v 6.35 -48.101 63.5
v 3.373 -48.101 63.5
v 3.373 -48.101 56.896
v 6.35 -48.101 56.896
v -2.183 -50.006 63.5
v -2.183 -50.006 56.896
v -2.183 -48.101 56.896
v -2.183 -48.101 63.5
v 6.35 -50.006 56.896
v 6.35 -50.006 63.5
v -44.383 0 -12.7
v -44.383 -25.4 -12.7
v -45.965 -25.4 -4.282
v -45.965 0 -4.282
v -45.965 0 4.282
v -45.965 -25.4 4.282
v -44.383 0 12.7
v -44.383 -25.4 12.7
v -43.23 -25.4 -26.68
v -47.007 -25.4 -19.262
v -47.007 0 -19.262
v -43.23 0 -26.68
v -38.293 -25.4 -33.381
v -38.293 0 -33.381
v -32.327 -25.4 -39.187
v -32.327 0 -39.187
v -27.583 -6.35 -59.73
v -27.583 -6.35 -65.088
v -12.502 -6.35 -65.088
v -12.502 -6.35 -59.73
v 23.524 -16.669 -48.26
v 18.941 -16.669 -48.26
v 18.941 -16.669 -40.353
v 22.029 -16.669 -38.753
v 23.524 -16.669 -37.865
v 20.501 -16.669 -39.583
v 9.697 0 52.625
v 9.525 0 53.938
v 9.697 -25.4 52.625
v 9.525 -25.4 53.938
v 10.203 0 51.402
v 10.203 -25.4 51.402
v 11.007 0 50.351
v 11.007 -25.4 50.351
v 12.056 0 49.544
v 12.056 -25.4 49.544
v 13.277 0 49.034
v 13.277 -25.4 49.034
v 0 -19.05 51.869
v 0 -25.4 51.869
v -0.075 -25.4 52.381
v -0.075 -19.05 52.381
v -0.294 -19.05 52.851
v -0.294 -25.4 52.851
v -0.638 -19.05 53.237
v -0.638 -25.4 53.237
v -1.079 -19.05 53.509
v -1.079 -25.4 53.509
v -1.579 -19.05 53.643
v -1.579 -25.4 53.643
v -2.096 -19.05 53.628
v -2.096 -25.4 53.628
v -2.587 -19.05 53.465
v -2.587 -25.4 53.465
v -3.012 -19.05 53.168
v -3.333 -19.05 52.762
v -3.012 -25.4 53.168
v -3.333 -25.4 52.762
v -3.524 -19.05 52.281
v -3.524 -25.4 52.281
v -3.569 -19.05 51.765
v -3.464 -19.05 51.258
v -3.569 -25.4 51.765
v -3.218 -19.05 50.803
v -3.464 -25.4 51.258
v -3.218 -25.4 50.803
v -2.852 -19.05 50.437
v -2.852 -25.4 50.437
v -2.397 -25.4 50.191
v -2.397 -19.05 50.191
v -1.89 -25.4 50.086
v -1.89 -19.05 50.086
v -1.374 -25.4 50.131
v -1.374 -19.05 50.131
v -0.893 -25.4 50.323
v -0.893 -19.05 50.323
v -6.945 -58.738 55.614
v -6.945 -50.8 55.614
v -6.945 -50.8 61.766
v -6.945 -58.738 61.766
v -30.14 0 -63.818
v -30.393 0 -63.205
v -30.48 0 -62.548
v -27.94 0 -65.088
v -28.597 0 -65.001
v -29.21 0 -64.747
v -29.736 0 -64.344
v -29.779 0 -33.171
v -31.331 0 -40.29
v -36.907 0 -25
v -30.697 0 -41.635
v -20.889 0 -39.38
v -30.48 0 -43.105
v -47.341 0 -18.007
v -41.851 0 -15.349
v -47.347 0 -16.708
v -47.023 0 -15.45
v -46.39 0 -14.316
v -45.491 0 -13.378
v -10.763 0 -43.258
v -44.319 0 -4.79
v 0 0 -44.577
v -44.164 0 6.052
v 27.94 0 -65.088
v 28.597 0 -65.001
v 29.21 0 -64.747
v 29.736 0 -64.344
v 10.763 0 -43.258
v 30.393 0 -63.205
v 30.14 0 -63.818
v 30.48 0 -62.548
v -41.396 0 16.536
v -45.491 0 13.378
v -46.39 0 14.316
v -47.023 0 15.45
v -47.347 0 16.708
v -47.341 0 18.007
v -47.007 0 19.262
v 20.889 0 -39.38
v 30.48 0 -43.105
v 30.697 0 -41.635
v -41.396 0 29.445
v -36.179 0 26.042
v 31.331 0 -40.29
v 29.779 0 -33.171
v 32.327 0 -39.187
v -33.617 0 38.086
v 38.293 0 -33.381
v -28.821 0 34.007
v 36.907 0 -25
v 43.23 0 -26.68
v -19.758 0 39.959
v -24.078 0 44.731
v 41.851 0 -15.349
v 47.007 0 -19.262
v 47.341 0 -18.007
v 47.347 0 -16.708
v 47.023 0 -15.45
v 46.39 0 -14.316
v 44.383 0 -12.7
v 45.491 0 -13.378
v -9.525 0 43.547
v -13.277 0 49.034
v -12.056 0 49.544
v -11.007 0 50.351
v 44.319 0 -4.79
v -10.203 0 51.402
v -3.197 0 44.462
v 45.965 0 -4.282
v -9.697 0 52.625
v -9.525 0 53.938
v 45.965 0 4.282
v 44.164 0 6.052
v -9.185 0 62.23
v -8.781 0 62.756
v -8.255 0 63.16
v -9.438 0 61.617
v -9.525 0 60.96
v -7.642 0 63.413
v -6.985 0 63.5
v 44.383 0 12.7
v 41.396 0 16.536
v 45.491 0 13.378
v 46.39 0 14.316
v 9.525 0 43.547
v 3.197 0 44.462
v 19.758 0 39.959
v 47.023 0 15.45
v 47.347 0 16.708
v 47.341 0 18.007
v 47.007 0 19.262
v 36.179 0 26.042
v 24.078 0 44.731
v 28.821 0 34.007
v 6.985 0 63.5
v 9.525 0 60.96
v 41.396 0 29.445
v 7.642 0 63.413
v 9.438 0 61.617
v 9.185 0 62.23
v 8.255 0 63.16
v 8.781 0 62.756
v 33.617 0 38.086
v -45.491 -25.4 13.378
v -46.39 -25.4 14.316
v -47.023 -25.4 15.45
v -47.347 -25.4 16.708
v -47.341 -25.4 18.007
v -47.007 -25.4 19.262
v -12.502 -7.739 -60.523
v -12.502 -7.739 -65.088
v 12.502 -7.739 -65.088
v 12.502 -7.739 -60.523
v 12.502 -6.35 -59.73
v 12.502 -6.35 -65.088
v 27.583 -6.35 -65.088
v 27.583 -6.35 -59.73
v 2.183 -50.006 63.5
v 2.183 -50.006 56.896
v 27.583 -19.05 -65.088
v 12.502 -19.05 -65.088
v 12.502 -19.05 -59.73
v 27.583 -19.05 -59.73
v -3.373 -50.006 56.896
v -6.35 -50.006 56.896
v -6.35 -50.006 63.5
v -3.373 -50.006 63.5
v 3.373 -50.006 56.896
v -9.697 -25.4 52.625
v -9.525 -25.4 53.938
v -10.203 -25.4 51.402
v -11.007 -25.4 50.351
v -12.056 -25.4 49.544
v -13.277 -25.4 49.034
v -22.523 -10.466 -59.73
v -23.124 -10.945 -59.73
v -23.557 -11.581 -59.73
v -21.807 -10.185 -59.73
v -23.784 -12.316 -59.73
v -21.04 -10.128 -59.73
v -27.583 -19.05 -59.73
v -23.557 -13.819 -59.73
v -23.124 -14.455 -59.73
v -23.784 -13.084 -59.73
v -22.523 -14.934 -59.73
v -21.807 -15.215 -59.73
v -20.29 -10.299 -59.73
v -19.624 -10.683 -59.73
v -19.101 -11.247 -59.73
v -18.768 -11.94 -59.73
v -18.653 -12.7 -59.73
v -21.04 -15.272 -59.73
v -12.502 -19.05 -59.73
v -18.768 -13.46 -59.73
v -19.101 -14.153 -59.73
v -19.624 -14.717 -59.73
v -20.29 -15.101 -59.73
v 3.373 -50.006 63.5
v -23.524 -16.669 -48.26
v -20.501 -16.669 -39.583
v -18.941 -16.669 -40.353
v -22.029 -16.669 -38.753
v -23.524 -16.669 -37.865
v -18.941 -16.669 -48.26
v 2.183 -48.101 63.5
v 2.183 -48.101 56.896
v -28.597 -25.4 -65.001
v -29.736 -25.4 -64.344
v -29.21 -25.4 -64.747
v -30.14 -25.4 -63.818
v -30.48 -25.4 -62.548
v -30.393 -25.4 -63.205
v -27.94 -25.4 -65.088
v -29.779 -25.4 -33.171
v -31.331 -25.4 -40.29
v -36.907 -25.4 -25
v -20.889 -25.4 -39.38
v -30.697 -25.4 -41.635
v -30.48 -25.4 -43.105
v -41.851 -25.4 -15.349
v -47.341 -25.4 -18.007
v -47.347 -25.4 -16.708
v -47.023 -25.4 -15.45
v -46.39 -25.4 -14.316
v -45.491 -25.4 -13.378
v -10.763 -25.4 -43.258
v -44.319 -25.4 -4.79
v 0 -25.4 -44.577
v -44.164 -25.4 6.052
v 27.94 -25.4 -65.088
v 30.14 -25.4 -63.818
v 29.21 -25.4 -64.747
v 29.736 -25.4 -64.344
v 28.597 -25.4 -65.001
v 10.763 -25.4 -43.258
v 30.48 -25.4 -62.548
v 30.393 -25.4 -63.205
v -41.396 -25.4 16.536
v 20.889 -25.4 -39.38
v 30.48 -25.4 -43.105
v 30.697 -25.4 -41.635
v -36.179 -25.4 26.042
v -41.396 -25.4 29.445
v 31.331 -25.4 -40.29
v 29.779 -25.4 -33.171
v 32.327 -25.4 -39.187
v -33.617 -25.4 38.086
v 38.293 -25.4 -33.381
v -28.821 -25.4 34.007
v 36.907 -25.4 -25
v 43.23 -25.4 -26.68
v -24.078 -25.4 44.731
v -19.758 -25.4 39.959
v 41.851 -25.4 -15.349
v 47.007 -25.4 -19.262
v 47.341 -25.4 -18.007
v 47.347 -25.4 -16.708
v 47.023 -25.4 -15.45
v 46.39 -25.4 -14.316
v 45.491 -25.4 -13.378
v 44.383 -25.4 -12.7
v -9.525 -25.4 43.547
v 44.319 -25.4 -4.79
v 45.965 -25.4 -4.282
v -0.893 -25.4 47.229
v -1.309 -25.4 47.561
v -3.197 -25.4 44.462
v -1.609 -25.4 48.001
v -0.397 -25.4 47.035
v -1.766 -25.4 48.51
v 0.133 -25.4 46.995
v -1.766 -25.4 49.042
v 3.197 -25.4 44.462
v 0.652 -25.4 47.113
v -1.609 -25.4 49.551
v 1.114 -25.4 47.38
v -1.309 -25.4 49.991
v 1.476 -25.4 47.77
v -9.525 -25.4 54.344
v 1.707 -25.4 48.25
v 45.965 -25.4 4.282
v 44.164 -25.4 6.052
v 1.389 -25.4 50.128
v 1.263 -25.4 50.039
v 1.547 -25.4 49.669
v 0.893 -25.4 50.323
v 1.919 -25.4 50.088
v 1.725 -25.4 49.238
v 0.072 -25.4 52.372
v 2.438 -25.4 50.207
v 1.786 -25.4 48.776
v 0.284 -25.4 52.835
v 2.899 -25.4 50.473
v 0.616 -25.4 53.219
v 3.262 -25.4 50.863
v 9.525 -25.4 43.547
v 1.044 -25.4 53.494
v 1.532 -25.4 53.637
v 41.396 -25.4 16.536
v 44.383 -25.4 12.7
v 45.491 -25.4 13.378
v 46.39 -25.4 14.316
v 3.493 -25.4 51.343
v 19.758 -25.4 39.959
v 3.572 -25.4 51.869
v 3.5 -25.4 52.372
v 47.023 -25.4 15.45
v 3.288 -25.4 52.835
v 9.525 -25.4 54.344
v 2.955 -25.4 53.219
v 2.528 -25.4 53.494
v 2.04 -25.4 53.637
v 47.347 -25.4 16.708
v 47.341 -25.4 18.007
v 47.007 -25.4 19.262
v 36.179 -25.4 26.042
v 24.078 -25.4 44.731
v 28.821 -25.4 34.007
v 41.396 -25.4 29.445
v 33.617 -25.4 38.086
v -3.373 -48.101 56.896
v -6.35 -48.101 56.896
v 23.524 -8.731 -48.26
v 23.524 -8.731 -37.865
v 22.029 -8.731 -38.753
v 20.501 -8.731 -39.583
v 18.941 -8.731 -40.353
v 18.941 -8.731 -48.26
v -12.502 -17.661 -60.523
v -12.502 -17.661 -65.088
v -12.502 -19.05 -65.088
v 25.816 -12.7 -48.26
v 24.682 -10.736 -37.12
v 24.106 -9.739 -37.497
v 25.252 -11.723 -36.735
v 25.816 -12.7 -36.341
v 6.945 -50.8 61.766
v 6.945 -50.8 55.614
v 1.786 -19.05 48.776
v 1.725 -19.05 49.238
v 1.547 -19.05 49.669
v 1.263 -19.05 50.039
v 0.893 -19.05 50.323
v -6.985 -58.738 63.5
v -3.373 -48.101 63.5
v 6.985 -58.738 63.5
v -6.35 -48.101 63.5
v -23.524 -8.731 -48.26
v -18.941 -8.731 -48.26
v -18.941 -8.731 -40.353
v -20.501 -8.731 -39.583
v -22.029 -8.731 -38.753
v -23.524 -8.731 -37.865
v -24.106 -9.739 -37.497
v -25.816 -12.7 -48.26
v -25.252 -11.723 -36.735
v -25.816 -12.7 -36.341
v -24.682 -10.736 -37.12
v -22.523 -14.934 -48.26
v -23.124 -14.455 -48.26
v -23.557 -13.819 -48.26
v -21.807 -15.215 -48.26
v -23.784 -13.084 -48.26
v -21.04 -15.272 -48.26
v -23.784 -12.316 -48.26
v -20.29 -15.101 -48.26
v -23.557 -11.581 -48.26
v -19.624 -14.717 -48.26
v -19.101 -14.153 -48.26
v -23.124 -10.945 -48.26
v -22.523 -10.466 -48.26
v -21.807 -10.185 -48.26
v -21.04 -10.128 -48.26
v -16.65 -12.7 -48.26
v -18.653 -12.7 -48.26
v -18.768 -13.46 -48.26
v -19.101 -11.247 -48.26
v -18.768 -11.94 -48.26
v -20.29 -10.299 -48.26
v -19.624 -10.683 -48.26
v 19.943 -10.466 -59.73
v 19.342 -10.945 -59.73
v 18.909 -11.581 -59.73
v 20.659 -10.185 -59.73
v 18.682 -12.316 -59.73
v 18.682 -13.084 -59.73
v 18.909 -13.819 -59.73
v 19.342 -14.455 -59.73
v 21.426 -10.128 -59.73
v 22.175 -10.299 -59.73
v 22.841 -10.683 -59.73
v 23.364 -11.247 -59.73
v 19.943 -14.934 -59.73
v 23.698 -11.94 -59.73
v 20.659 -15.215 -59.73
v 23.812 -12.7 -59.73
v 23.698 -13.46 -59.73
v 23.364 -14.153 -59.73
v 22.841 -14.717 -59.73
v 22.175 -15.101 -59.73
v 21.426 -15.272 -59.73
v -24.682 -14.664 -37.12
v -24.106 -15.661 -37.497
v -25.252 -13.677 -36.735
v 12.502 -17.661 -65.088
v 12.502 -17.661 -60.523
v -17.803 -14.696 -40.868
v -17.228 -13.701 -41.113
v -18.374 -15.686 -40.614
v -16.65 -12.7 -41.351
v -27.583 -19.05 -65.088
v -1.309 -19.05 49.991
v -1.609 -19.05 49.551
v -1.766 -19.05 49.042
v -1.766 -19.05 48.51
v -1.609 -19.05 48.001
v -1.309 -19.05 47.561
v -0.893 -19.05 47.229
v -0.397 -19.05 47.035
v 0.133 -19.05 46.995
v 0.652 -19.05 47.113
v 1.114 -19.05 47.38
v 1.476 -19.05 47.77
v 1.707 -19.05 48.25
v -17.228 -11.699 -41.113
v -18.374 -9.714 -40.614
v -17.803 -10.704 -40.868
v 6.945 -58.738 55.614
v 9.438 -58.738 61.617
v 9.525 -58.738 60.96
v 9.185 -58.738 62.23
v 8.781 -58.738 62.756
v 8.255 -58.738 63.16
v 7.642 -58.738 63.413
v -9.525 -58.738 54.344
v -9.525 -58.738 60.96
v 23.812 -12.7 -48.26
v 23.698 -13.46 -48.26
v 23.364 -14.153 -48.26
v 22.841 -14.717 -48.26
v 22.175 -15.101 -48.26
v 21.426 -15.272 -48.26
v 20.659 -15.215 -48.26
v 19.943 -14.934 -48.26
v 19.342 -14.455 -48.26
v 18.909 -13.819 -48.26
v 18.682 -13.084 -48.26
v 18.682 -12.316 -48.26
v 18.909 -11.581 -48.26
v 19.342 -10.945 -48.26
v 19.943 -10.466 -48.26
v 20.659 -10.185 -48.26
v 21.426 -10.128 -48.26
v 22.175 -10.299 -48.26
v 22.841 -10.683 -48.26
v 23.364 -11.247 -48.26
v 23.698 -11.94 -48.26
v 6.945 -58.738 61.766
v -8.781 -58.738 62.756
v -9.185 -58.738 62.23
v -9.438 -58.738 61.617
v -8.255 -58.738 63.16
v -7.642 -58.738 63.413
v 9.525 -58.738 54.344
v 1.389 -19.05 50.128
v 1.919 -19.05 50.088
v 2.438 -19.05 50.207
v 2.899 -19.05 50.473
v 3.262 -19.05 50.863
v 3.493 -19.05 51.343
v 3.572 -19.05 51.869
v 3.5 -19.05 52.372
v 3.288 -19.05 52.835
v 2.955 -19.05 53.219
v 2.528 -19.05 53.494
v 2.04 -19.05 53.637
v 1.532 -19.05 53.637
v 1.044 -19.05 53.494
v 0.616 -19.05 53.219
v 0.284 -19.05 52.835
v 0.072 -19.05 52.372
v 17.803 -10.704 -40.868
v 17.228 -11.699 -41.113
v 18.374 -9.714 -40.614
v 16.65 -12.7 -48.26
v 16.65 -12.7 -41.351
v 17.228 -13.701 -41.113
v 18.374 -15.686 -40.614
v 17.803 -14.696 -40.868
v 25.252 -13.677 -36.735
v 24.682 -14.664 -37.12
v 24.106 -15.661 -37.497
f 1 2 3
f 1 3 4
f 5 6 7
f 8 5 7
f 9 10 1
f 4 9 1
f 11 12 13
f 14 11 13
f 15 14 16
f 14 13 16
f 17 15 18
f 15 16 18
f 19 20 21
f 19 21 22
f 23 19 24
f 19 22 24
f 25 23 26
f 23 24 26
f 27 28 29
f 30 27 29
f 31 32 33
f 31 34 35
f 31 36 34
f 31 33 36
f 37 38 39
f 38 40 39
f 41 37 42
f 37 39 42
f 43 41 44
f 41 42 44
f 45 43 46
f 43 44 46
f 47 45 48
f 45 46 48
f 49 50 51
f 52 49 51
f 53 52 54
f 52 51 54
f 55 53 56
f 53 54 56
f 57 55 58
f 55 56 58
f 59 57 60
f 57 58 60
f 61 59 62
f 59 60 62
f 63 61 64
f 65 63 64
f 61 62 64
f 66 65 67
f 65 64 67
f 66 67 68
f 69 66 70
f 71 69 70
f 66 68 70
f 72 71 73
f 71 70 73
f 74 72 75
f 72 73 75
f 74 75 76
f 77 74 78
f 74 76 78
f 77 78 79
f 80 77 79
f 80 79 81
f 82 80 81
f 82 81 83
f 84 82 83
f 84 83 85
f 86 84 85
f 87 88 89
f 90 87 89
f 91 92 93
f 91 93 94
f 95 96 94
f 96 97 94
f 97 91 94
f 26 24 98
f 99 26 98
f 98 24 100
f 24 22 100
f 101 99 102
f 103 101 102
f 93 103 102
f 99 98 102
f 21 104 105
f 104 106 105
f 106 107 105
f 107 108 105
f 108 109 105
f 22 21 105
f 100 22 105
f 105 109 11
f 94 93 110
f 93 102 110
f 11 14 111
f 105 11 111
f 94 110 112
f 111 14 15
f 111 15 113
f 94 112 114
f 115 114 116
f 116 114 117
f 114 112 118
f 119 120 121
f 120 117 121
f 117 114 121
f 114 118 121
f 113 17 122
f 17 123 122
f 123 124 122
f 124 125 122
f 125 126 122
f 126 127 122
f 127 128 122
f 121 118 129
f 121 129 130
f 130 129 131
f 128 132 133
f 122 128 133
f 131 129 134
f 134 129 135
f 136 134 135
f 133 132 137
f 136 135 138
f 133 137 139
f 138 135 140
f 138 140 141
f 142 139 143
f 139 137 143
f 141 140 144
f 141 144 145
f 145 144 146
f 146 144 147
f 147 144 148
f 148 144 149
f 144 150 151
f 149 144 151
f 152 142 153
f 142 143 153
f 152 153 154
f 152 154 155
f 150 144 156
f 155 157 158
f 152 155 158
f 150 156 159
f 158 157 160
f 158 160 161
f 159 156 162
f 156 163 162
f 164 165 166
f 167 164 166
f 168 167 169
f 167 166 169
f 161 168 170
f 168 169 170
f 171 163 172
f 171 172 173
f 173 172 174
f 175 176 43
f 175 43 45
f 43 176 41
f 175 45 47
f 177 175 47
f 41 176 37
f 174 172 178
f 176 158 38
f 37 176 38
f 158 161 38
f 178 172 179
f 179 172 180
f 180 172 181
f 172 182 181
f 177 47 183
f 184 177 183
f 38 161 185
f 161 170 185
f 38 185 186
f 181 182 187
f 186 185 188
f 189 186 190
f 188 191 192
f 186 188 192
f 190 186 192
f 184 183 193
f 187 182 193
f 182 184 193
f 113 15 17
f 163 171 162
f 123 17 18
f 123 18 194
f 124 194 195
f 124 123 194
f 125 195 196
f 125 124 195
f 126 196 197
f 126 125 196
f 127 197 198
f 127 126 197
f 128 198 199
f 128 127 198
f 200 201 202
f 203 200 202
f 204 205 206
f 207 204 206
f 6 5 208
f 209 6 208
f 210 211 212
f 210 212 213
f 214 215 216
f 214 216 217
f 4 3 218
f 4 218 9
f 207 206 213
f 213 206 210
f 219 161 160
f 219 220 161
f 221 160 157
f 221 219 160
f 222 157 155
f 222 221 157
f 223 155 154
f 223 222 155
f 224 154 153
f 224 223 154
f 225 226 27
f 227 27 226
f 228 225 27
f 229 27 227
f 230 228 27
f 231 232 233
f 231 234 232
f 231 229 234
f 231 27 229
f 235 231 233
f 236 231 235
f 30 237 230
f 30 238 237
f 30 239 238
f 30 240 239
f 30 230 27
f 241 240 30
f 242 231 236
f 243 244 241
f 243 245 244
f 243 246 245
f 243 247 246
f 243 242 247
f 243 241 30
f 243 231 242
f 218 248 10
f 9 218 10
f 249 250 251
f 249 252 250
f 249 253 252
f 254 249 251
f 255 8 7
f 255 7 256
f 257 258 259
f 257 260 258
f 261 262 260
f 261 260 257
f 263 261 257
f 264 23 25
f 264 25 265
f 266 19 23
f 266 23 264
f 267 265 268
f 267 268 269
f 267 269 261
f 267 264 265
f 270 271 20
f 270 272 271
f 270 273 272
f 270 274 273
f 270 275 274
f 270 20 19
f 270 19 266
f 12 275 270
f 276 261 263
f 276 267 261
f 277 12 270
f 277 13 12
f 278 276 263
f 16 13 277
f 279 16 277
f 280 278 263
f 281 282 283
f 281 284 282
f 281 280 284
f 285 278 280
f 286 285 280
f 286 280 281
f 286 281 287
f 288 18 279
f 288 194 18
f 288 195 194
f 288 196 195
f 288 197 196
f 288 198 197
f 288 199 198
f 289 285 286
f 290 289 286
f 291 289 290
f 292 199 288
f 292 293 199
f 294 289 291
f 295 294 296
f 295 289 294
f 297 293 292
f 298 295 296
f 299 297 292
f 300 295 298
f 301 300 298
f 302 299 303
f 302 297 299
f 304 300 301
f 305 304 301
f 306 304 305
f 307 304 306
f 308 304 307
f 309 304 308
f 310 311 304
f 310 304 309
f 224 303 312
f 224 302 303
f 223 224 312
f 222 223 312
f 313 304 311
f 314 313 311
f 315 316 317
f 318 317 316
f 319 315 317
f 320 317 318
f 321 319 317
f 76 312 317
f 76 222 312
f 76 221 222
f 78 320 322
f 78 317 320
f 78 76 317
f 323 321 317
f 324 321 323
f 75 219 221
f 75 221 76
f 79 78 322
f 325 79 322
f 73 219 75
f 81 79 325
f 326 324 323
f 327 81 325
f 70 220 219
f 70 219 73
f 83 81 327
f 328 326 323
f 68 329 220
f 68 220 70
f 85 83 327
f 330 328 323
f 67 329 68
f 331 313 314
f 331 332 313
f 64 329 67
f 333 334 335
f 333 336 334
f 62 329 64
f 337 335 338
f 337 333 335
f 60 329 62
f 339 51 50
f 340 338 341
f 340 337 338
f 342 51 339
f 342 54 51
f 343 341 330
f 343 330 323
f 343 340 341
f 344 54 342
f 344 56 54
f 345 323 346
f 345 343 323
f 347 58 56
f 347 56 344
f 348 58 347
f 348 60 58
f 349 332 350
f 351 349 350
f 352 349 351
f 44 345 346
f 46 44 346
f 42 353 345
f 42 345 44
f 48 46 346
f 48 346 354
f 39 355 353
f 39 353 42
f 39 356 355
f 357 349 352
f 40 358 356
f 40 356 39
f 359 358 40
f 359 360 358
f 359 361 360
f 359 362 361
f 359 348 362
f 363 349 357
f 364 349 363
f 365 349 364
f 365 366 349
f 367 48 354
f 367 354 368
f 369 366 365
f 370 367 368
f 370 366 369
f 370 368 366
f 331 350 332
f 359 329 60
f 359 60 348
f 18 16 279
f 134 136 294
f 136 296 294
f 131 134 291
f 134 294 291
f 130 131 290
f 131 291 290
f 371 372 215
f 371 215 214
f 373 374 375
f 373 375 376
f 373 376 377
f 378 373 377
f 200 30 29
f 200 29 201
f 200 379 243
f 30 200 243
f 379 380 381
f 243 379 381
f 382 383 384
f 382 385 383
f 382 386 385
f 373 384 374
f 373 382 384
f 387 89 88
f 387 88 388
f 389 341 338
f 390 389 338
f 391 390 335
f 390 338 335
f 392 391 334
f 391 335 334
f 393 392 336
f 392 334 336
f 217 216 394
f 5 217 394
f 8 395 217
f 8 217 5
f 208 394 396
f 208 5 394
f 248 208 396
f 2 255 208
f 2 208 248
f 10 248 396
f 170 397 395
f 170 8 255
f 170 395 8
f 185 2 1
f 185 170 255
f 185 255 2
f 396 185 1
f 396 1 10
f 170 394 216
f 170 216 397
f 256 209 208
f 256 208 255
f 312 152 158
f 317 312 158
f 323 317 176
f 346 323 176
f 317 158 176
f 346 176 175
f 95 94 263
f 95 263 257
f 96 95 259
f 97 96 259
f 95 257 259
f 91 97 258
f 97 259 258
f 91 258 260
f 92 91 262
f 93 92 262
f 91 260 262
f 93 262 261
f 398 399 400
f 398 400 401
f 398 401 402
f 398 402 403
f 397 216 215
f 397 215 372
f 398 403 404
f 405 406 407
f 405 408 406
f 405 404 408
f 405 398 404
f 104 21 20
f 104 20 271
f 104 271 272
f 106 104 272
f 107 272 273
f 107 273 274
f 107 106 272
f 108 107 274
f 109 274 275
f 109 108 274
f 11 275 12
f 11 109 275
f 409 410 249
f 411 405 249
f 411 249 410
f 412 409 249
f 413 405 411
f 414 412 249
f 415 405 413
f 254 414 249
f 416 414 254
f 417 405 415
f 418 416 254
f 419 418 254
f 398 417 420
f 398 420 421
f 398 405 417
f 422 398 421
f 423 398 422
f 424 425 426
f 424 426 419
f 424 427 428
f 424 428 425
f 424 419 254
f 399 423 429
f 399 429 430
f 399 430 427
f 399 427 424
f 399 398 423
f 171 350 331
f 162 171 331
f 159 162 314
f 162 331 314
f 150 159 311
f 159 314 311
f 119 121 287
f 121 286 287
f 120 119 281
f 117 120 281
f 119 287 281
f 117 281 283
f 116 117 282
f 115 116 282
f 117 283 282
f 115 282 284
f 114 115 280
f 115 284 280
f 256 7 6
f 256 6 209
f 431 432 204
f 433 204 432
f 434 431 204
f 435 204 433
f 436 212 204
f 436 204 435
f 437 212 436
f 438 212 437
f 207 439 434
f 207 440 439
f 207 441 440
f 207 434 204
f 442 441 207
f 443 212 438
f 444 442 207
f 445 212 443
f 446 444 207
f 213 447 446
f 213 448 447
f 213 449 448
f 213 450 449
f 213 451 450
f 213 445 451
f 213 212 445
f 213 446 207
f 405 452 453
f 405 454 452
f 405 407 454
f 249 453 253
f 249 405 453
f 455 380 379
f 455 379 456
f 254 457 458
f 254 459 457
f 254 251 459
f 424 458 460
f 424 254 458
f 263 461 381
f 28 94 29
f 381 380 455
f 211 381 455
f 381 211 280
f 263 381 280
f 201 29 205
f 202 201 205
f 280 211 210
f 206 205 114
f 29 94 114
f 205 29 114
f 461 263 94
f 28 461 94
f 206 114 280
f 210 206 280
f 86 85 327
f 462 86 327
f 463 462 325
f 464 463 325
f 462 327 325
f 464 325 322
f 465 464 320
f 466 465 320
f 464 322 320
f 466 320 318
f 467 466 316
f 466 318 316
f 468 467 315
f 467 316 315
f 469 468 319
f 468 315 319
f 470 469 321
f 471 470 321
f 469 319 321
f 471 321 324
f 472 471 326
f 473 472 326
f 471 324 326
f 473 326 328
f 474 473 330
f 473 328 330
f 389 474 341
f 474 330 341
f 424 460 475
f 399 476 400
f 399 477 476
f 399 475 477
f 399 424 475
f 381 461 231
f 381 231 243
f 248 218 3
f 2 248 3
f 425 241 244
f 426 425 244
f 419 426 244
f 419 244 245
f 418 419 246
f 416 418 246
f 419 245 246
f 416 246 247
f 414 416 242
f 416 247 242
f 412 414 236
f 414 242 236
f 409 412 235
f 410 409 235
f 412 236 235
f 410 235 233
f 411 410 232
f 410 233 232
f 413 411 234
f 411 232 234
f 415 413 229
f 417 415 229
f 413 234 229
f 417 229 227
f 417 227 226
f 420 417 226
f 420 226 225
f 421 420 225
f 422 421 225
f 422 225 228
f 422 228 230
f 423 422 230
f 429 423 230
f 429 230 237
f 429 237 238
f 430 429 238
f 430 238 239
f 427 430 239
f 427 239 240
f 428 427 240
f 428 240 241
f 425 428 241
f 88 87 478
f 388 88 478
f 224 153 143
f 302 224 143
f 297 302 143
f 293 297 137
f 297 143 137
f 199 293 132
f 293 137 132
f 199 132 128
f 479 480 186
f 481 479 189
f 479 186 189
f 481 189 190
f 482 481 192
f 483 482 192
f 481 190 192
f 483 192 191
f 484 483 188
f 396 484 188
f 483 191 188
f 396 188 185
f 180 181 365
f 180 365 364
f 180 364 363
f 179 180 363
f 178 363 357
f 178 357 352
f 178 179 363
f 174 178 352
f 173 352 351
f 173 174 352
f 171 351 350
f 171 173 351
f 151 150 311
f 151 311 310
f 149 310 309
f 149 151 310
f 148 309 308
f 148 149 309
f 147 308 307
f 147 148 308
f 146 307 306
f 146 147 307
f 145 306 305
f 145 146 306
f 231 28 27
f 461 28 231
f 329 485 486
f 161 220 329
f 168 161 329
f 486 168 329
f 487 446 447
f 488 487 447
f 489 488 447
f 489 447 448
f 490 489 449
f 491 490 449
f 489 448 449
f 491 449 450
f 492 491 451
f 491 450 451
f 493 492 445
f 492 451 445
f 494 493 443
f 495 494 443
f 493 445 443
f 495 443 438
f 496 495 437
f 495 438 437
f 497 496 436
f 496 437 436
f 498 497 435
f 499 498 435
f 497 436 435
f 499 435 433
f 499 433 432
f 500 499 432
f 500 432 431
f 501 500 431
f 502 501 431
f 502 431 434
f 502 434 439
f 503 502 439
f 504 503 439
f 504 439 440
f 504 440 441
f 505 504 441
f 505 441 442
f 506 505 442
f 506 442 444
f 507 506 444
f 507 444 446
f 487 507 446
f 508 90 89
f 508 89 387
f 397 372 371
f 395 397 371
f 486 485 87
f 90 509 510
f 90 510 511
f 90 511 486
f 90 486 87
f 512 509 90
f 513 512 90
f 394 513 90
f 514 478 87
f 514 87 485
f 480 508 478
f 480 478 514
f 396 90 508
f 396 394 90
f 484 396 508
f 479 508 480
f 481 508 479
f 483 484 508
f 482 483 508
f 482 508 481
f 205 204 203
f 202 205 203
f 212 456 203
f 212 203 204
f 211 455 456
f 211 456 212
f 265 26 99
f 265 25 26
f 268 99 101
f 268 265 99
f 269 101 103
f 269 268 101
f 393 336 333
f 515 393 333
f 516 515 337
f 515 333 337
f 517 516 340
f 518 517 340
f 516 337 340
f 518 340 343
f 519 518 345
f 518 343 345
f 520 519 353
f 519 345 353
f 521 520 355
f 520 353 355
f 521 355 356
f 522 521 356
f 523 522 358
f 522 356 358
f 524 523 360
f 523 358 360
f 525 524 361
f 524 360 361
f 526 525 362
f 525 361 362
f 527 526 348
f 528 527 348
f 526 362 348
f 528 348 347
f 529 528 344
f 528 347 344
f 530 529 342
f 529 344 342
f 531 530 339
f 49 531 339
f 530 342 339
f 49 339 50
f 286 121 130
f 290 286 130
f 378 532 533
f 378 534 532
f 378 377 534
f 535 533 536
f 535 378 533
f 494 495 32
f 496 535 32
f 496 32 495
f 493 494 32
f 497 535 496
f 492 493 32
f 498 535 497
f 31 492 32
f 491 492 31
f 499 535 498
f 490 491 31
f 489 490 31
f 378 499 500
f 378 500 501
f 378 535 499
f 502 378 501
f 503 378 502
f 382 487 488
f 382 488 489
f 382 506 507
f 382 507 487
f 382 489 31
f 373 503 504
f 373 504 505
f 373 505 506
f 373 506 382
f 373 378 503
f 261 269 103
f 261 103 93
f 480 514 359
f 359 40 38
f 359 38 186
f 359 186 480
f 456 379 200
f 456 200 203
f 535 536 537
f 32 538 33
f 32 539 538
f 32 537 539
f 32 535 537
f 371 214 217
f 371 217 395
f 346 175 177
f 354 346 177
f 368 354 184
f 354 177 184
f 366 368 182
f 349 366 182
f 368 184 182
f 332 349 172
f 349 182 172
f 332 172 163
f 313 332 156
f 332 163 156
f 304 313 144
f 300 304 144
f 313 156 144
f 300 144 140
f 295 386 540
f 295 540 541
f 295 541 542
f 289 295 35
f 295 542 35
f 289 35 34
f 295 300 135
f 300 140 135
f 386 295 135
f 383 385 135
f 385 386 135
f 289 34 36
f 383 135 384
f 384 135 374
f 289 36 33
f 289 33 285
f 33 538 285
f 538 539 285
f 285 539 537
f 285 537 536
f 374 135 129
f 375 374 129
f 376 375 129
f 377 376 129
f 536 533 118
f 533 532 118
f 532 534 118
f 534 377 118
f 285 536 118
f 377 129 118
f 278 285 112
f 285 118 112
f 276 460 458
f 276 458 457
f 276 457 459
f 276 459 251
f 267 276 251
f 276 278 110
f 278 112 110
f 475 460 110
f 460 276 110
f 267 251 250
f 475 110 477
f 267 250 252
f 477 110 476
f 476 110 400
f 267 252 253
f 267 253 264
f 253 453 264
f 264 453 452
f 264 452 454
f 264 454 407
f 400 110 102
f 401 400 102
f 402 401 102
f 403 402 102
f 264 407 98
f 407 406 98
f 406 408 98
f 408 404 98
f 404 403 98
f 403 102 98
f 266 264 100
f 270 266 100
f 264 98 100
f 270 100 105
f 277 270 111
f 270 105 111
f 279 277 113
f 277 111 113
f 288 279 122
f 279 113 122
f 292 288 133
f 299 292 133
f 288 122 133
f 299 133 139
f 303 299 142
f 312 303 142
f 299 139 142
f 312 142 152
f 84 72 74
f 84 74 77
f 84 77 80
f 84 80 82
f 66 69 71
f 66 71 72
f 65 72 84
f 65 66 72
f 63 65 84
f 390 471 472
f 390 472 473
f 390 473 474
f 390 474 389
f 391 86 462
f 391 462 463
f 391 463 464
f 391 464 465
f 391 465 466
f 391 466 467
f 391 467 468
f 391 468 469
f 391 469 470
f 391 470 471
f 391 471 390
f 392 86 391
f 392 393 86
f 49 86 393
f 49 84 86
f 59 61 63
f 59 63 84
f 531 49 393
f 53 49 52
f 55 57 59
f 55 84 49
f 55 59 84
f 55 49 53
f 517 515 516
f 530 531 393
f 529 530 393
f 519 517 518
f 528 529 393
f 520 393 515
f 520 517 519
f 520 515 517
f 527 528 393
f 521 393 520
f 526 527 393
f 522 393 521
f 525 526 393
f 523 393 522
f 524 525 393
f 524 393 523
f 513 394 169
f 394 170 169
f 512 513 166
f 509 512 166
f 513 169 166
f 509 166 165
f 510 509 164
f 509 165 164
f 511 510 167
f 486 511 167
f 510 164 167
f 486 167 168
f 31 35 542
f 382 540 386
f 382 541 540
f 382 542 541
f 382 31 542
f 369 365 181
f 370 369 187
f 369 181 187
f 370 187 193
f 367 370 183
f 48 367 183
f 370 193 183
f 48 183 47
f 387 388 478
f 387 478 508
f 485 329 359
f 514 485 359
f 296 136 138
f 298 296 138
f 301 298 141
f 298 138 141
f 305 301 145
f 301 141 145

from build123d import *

# Parameters (mm, degrees)
F1_DEPTH     = 25.4
F3_DEPTH     = 6.35
F5_DEPTH     = 25.4
F6_W         = 15.08125
F6_H         = 12.7
F7_DEPTH     = 5.3578125
F8_R         = 2.5796875
F9_DEPTH     = 25.4
F12_DEPTH    = 25.4
F13_W        = 19.05
F13_H        = 9.1559581755
F14_DEPTH    = 33.3375
F15_W        = 13.890625
F15_H        = 6.1515625
F16_DEPTH    = 7.9375
F17_W        = 12.7
F17_H        = 1.905
F18_DEPTH    = 6.604
F19_W        = 1.190625
F19_H        = 1.905
F20_DEPTH    = 6.604
F21_W        = 25.003125
F21_H        = 9.921875
F22_DEPTH    = 4.5640625
F24_DEPTH    = 27.94
F25_T1_DEPTH = 59.9739709134
F26_R        = 2.54
F27_R        = 2.54
F28_R        = 5.08


# Not quite as in the source:
# - a fillet or chamfer that OpenCascade refuses, or shapes differently, is made with other operations: its cross-section is extruded or revolved along the edge and cut away or added


with BuildPart() as f1:
    # F0 (on Front) → F1 (new body)
    with BuildSketch(Plane.XZ):
        with BuildLine():
            ThreePointArc((9.525, 43.5474833257), (34.7253859158, 27.9509660298), (44.577, 0))
            ThreePointArc((44.577, 0), (-27.9509660298, -34.7253859158), (-9.525, 43.5474833257))
            Line((-9.525, 43.5474833257), (-9.525, 49.8990418245))
            ThreePointArc((-9.525, 49.8990418245), (-32.3787739113, -39.1440289189), (50.8, 0))
            ThreePointArc((50.8, 0), (39.1440289189, 32.3787739113), (9.525, 49.8990418245))
            Line((9.525, 49.8990418245), (9.525, 43.5474833257))
        make_face()
        with BuildLine():
            ThreePointArc((-9.525, 43.5474833257), (0, 44.577), (9.525, 43.5474833257))
            Line((9.525, 43.5474833257), (9.525, 49.8990418245))
            ThreePointArc((9.525, 49.8990418245), (0, 50.8), (-9.525, 49.8990418245))
            Line((-9.525, 49.8990418245), (-9.525, 43.5474833257))
        make_face()
        with BuildLine():
            ThreePointArc((-9.525, 49.8990418245), (0, 50.8), (9.525, 49.8990418245))
            Line((9.525, 49.8990418245), (9.525, 63.5))
            Line((9.525, 63.5), (-9.525, 63.5))
            Line((-9.525, 63.5), (-9.525, 49.8990418245))
        make_face()
    extrude(amount=F1_DEPTH)

    # F2 (on face) → F3 (cut)
    with BuildSketch(Plane.XZ.offset(25.4)):
        with BuildLine():
            ThreePointArc((0.8929687032, 50.3226047716), (2.6789062266, 50.322604731), (3.571875, 51.8692719891))
            ThreePointArc((3.571875, 51.8692719891), (1.7859375, 53.6552094891), (0, 51.8692719891))
            ThreePointArc((0, 51.8692719891), (0.2392702419, 50.9763032626), (0.8929687032, 50.3226047716))
        make_face()
        with BuildLine():
            ThreePointArc((-0.8929687383, 50.3226047513), (-0.2392702521, 50.976303245), (0, 51.8692719891))
            ThreePointArc((0, 51.8692719891), (-3.3326047479, 52.7622407333), (-0.8929687383, 50.3226047513))
        make_face()
        with BuildLine():
            ThreePointArc((0.8929687032, 50.3226047716), (0.2392702419, 50.9763032626), (0, 51.8692719891))
            ThreePointArc((0, 51.8692719891), (-0.2392702521, 50.976303245), (-0.8929687383, 50.3226047513))
            ThreePointArc((-0.8929687383, 50.3226047513), (-2.03e-08, 50.561875), (0.8929687032, 50.3226047716))
        make_face()
        with BuildLine():
            ThreePointArc((1.7859375, 48.7759375), (1.546667231, 49.6689062734), (0.8929687032, 50.3226047716))
            ThreePointArc((0.8929687032, 50.3226047716), (-2.03e-08, 50.561875), (-0.8929687383, 50.3226047513))
            ThreePointArc((-0.8929687383, 50.3226047513), (-0.8929687558, 47.2292702588), (1.7859375, 48.7759375))
        make_face()
    extrude(amount=-F3_DEPTH, mode=Mode.SUBTRACT)

    # F4 (on Front) → F5 (join)
    with BuildSketch(Plane.XZ):
        with BuildLine():
            Line((-30.48, -65.0875), (30.48, -65.0875))
            Line((30.48, -65.0875), (30.48, -40.64))
            ThreePointArc((30.48, -40.64), (0, -50.8), (-30.48, -40.64))
            Line((-30.48, -40.64), (-30.48, -65.0875))
        make_face()
    extrude(amount=F5_DEPTH)

    # F6 (on face) → F7 (cut)
    with BuildSketch(Plane(origin=(0, 0, -65.0875), x_dir=(1, 0, 0), z_dir=(0, 0, -1))):
        with Locations((20.0421875, 12.7)):
            Rectangle(F6_W, F6_H)
        with Locations((-20.0421875, 12.7)):
            Rectangle(F6_W, F6_H)
    extrude(amount=-F7_DEPTH, mode=Mode.SUBTRACT)

    # F8 (on face) → F9 (cut)
    with BuildSketch(Plane(origin=(0, 0, -59.7296875), x_dir=(1, 0, 0), z_dir=(0, 0, -1))):
        with Locations((21.2328125, 12.7)):
            Circle(F8_R)
        with Locations((-21.2328125, 12.7)):
            Circle(F8_R)
    extrude(amount=-F9_DEPTH, mode=Mode.SUBTRACT)

    # F11 (on offset) → F12 (cut)
    with BuildSketch(Plane.XY.offset(-48.26)):
        Polygon((18.9414536192, -16.66875), (23.5241713808, -16.66875), (25.8155302617, -12.7), (23.5241713808, -8.73125), (18.9414536192, -8.73125), (16.6500947383, -12.7), align=None)
        Polygon((-25.8155302617, -12.7), (-23.5241713808, -16.66875), (-18.9414536192, -16.66875), (-16.6500947383, -12.7), (-18.9414536192, -8.73125), (-23.5241713808, -8.73125), align=None)
    extrude(amount=F12_DEPTH, mode=Mode.SUBTRACT)

    # F13 (on face) → F14 (join)
    with BuildSketch(Plane.XZ.offset(25.4)):
        with Locations((0, 58.9220209122)):
            Rectangle(F13_W, F13_H)
    extrude(amount=F14_DEPTH)

    # F15 (on face) → F16 (cut)
    with BuildSketch(Plane.XZ.offset(58.7375)):
        with Locations((0, 58.6898230745)):
            Rectangle(F15_W, F15_H)
    extrude(amount=-F16_DEPTH, mode=Mode.SUBTRACT)

    # F17 (on face) → F18 (cut)
    with BuildSketch(Plane.XY.offset(63.5)):
        with Locations((0, -49.05375)):
            Rectangle(F17_W, F17_H)
    extrude(amount=-F18_DEPTH, mode=Mode.SUBTRACT)

    # F19 (on face) → F20 (join)
    with BuildSketch(Plane.XY.offset(56.896)):
        with Locations((-2.778125, -49.05375)):
            Rectangle(F19_W, F19_H)
        with Locations((2.778125, -49.05375)):
            Rectangle(F19_W, F19_H)
    extrude(amount=F20_DEPTH)

    # F21 (on face) → F22 (cut)
    with BuildSketch(Plane(origin=(0, 0, -65.0875), x_dir=(1, 0, 0), z_dir=(0, 0, -1))):
        with Locations((0, 12.7)):
            Rectangle(F21_W, F21_H)
    extrude(amount=-F22_DEPTH, mode=Mode.SUBTRACT)

    # F23 (on face) → F24 (cut)
    with BuildSketch(Plane.XZ.offset(25.4)):
        with BuildLine():
            ThreePointArc((44.3832294932, 12.7), (46.1645, 0), (44.3832294932, -12.7))
            Line((44.3832294932, -12.7), (55.8275170624, -12.7))
            Line((55.8275170624, -12.7), (55.8275170624, 12.7))
            Line((55.8275170624, 12.7), (44.3832294932, 12.7))
        make_face()
        with BuildLine():
            Line((-44.3832294932, 12.7), (-55.6385964155, 12.7))
            Line((-55.6385964155, 12.7), (-55.6385964155, -12.7))
            Line((-55.6385964155, -12.7), (-44.3832294932, -12.7))
            ThreePointArc((-44.3832294932, -12.7), (-46.1645, 0), (-44.3832294932, 12.7))
        make_face()
    extrude(amount=-F24_DEPTH, mode=Mode.SUBTRACT)

    # F25: fillet of radius 5.08 on 4 edges, made by hand

    # F25_s2 → F25_t1 (cut)
    with BuildSketch(Plane.XZ.offset(-17.2869854567)):
        with BuildLine():
            ThreePointArc((-44.3832294932, 12.7), (-47.0229133194, 15.4501150062), (-47.0065282778, 19.2620429672))
            Line((-47.0065282778, 19.2620429672), (-47.1005413343, 19.3005670532))
            ThreePointArc((-47.1005413343, 19.3005670532), (-48.3049064769, 16.050199152), (-49.2852622738, 12.7254))
            Line((-49.2852622738, 12.7254), (-49.1868884968, 12.5984))
            ThreePointArc((-49.1868884968, 12.5984), (-46.785058995, 12.5984), (-44.4247765741, 12.6072832266))
            Line((-44.4247765741, 12.6072832266), (-44.3832294932, 12.7))
        make_face()
        with BuildLine():
            ThreePointArc((-47.0065282778, -19.2620429672), (-47.0229133194, -15.4501150062), (-44.3832294932, -12.7))
            Line((-44.3832294932, -12.7), (-44.4247765741, -12.6072832266))
            ThreePointArc((-44.4247765741, -12.6072832266), (-46.785058995, -12.5984), (-49.1868884968, -12.5984))
            Line((-49.1868884968, -12.5984), (-49.2852622738, -12.7254))
            ThreePointArc((-49.2852622738, -12.7254), (-48.3049064769, -16.050199152), (-47.1005413343, -19.3005670532))
            Line((-47.1005413343, -19.3005670532), (-47.0065282778, -19.2620429672))
        make_face()
        with BuildLine():
            ThreePointArc((44.3832294932, -12.7), (47.0229133194, -15.4501150062), (47.0065282778, -19.2620429672))
            Line((47.0065282778, -19.2620429672), (47.1005413343, -19.3005670532))
            ThreePointArc((47.1005413343, -19.3005670532), (48.3049064769, -16.050199152), (49.2852622738, -12.7254))
            Line((49.2852622738, -12.7254), (49.1868884968, -12.5984))
            ThreePointArc((49.1868884968, -12.5984), (46.785058995, -12.5984), (44.4247765741, -12.6072832266))
            Line((44.4247765741, -12.6072832266), (44.3832294932, -12.7))
        make_face()
        with BuildLine():
            ThreePointArc((47.0065282778, 19.2620429672), (47.0229133194, 15.4501150062), (44.3832294932, 12.7))
            Line((44.3832294932, 12.7), (44.4247765741, 12.6072832266))
            ThreePointArc((44.4247765741, 12.6072832266), (46.785058995, 12.5984), (49.1868884968, 12.5984))
            Line((49.1868884968, 12.5984), (49.2852622738, 12.7254))
            ThreePointArc((49.2852622738, 12.7254), (48.3049064769, 16.050199152), (47.1005413343, 19.3005670532))
            Line((47.1005413343, 19.3005670532), (47.0065282778, 19.2620429672))
        make_face()
    extrude(amount=F25_T1_DEPTH, mode=Mode.SUBTRACT)

    # F26
    f26_edges = [f1.edges().sort_by_distance(p)[0] for p in [
        (30.48, -12.7, -65.0875),
        (-30.48, -12.7, -65.0875),
    ]]
    fillet(f26_edges, radius=F26_R)

    # F27
    f27_edges = [f1.edges().sort_by_distance(p)[0] for p in [
        (9.525, -29.36875, 63.5),
        (-9.525, -29.36875, 63.5),
    ]]
    fillet(f27_edges, radius=F27_R)

    # F28
    f28_edges = [f1.edges().sort_by_distance(p)[0] for p in [
        (30.48, -12.7, -40.64),
        (-30.48, -12.7, -40.64),
        (-9.525, -12.7, 49.899042),
        (9.525, -12.7, 49.899042),
    ]]
    fillet(f28_edges, radius=F28_R)


solid = f1.part
